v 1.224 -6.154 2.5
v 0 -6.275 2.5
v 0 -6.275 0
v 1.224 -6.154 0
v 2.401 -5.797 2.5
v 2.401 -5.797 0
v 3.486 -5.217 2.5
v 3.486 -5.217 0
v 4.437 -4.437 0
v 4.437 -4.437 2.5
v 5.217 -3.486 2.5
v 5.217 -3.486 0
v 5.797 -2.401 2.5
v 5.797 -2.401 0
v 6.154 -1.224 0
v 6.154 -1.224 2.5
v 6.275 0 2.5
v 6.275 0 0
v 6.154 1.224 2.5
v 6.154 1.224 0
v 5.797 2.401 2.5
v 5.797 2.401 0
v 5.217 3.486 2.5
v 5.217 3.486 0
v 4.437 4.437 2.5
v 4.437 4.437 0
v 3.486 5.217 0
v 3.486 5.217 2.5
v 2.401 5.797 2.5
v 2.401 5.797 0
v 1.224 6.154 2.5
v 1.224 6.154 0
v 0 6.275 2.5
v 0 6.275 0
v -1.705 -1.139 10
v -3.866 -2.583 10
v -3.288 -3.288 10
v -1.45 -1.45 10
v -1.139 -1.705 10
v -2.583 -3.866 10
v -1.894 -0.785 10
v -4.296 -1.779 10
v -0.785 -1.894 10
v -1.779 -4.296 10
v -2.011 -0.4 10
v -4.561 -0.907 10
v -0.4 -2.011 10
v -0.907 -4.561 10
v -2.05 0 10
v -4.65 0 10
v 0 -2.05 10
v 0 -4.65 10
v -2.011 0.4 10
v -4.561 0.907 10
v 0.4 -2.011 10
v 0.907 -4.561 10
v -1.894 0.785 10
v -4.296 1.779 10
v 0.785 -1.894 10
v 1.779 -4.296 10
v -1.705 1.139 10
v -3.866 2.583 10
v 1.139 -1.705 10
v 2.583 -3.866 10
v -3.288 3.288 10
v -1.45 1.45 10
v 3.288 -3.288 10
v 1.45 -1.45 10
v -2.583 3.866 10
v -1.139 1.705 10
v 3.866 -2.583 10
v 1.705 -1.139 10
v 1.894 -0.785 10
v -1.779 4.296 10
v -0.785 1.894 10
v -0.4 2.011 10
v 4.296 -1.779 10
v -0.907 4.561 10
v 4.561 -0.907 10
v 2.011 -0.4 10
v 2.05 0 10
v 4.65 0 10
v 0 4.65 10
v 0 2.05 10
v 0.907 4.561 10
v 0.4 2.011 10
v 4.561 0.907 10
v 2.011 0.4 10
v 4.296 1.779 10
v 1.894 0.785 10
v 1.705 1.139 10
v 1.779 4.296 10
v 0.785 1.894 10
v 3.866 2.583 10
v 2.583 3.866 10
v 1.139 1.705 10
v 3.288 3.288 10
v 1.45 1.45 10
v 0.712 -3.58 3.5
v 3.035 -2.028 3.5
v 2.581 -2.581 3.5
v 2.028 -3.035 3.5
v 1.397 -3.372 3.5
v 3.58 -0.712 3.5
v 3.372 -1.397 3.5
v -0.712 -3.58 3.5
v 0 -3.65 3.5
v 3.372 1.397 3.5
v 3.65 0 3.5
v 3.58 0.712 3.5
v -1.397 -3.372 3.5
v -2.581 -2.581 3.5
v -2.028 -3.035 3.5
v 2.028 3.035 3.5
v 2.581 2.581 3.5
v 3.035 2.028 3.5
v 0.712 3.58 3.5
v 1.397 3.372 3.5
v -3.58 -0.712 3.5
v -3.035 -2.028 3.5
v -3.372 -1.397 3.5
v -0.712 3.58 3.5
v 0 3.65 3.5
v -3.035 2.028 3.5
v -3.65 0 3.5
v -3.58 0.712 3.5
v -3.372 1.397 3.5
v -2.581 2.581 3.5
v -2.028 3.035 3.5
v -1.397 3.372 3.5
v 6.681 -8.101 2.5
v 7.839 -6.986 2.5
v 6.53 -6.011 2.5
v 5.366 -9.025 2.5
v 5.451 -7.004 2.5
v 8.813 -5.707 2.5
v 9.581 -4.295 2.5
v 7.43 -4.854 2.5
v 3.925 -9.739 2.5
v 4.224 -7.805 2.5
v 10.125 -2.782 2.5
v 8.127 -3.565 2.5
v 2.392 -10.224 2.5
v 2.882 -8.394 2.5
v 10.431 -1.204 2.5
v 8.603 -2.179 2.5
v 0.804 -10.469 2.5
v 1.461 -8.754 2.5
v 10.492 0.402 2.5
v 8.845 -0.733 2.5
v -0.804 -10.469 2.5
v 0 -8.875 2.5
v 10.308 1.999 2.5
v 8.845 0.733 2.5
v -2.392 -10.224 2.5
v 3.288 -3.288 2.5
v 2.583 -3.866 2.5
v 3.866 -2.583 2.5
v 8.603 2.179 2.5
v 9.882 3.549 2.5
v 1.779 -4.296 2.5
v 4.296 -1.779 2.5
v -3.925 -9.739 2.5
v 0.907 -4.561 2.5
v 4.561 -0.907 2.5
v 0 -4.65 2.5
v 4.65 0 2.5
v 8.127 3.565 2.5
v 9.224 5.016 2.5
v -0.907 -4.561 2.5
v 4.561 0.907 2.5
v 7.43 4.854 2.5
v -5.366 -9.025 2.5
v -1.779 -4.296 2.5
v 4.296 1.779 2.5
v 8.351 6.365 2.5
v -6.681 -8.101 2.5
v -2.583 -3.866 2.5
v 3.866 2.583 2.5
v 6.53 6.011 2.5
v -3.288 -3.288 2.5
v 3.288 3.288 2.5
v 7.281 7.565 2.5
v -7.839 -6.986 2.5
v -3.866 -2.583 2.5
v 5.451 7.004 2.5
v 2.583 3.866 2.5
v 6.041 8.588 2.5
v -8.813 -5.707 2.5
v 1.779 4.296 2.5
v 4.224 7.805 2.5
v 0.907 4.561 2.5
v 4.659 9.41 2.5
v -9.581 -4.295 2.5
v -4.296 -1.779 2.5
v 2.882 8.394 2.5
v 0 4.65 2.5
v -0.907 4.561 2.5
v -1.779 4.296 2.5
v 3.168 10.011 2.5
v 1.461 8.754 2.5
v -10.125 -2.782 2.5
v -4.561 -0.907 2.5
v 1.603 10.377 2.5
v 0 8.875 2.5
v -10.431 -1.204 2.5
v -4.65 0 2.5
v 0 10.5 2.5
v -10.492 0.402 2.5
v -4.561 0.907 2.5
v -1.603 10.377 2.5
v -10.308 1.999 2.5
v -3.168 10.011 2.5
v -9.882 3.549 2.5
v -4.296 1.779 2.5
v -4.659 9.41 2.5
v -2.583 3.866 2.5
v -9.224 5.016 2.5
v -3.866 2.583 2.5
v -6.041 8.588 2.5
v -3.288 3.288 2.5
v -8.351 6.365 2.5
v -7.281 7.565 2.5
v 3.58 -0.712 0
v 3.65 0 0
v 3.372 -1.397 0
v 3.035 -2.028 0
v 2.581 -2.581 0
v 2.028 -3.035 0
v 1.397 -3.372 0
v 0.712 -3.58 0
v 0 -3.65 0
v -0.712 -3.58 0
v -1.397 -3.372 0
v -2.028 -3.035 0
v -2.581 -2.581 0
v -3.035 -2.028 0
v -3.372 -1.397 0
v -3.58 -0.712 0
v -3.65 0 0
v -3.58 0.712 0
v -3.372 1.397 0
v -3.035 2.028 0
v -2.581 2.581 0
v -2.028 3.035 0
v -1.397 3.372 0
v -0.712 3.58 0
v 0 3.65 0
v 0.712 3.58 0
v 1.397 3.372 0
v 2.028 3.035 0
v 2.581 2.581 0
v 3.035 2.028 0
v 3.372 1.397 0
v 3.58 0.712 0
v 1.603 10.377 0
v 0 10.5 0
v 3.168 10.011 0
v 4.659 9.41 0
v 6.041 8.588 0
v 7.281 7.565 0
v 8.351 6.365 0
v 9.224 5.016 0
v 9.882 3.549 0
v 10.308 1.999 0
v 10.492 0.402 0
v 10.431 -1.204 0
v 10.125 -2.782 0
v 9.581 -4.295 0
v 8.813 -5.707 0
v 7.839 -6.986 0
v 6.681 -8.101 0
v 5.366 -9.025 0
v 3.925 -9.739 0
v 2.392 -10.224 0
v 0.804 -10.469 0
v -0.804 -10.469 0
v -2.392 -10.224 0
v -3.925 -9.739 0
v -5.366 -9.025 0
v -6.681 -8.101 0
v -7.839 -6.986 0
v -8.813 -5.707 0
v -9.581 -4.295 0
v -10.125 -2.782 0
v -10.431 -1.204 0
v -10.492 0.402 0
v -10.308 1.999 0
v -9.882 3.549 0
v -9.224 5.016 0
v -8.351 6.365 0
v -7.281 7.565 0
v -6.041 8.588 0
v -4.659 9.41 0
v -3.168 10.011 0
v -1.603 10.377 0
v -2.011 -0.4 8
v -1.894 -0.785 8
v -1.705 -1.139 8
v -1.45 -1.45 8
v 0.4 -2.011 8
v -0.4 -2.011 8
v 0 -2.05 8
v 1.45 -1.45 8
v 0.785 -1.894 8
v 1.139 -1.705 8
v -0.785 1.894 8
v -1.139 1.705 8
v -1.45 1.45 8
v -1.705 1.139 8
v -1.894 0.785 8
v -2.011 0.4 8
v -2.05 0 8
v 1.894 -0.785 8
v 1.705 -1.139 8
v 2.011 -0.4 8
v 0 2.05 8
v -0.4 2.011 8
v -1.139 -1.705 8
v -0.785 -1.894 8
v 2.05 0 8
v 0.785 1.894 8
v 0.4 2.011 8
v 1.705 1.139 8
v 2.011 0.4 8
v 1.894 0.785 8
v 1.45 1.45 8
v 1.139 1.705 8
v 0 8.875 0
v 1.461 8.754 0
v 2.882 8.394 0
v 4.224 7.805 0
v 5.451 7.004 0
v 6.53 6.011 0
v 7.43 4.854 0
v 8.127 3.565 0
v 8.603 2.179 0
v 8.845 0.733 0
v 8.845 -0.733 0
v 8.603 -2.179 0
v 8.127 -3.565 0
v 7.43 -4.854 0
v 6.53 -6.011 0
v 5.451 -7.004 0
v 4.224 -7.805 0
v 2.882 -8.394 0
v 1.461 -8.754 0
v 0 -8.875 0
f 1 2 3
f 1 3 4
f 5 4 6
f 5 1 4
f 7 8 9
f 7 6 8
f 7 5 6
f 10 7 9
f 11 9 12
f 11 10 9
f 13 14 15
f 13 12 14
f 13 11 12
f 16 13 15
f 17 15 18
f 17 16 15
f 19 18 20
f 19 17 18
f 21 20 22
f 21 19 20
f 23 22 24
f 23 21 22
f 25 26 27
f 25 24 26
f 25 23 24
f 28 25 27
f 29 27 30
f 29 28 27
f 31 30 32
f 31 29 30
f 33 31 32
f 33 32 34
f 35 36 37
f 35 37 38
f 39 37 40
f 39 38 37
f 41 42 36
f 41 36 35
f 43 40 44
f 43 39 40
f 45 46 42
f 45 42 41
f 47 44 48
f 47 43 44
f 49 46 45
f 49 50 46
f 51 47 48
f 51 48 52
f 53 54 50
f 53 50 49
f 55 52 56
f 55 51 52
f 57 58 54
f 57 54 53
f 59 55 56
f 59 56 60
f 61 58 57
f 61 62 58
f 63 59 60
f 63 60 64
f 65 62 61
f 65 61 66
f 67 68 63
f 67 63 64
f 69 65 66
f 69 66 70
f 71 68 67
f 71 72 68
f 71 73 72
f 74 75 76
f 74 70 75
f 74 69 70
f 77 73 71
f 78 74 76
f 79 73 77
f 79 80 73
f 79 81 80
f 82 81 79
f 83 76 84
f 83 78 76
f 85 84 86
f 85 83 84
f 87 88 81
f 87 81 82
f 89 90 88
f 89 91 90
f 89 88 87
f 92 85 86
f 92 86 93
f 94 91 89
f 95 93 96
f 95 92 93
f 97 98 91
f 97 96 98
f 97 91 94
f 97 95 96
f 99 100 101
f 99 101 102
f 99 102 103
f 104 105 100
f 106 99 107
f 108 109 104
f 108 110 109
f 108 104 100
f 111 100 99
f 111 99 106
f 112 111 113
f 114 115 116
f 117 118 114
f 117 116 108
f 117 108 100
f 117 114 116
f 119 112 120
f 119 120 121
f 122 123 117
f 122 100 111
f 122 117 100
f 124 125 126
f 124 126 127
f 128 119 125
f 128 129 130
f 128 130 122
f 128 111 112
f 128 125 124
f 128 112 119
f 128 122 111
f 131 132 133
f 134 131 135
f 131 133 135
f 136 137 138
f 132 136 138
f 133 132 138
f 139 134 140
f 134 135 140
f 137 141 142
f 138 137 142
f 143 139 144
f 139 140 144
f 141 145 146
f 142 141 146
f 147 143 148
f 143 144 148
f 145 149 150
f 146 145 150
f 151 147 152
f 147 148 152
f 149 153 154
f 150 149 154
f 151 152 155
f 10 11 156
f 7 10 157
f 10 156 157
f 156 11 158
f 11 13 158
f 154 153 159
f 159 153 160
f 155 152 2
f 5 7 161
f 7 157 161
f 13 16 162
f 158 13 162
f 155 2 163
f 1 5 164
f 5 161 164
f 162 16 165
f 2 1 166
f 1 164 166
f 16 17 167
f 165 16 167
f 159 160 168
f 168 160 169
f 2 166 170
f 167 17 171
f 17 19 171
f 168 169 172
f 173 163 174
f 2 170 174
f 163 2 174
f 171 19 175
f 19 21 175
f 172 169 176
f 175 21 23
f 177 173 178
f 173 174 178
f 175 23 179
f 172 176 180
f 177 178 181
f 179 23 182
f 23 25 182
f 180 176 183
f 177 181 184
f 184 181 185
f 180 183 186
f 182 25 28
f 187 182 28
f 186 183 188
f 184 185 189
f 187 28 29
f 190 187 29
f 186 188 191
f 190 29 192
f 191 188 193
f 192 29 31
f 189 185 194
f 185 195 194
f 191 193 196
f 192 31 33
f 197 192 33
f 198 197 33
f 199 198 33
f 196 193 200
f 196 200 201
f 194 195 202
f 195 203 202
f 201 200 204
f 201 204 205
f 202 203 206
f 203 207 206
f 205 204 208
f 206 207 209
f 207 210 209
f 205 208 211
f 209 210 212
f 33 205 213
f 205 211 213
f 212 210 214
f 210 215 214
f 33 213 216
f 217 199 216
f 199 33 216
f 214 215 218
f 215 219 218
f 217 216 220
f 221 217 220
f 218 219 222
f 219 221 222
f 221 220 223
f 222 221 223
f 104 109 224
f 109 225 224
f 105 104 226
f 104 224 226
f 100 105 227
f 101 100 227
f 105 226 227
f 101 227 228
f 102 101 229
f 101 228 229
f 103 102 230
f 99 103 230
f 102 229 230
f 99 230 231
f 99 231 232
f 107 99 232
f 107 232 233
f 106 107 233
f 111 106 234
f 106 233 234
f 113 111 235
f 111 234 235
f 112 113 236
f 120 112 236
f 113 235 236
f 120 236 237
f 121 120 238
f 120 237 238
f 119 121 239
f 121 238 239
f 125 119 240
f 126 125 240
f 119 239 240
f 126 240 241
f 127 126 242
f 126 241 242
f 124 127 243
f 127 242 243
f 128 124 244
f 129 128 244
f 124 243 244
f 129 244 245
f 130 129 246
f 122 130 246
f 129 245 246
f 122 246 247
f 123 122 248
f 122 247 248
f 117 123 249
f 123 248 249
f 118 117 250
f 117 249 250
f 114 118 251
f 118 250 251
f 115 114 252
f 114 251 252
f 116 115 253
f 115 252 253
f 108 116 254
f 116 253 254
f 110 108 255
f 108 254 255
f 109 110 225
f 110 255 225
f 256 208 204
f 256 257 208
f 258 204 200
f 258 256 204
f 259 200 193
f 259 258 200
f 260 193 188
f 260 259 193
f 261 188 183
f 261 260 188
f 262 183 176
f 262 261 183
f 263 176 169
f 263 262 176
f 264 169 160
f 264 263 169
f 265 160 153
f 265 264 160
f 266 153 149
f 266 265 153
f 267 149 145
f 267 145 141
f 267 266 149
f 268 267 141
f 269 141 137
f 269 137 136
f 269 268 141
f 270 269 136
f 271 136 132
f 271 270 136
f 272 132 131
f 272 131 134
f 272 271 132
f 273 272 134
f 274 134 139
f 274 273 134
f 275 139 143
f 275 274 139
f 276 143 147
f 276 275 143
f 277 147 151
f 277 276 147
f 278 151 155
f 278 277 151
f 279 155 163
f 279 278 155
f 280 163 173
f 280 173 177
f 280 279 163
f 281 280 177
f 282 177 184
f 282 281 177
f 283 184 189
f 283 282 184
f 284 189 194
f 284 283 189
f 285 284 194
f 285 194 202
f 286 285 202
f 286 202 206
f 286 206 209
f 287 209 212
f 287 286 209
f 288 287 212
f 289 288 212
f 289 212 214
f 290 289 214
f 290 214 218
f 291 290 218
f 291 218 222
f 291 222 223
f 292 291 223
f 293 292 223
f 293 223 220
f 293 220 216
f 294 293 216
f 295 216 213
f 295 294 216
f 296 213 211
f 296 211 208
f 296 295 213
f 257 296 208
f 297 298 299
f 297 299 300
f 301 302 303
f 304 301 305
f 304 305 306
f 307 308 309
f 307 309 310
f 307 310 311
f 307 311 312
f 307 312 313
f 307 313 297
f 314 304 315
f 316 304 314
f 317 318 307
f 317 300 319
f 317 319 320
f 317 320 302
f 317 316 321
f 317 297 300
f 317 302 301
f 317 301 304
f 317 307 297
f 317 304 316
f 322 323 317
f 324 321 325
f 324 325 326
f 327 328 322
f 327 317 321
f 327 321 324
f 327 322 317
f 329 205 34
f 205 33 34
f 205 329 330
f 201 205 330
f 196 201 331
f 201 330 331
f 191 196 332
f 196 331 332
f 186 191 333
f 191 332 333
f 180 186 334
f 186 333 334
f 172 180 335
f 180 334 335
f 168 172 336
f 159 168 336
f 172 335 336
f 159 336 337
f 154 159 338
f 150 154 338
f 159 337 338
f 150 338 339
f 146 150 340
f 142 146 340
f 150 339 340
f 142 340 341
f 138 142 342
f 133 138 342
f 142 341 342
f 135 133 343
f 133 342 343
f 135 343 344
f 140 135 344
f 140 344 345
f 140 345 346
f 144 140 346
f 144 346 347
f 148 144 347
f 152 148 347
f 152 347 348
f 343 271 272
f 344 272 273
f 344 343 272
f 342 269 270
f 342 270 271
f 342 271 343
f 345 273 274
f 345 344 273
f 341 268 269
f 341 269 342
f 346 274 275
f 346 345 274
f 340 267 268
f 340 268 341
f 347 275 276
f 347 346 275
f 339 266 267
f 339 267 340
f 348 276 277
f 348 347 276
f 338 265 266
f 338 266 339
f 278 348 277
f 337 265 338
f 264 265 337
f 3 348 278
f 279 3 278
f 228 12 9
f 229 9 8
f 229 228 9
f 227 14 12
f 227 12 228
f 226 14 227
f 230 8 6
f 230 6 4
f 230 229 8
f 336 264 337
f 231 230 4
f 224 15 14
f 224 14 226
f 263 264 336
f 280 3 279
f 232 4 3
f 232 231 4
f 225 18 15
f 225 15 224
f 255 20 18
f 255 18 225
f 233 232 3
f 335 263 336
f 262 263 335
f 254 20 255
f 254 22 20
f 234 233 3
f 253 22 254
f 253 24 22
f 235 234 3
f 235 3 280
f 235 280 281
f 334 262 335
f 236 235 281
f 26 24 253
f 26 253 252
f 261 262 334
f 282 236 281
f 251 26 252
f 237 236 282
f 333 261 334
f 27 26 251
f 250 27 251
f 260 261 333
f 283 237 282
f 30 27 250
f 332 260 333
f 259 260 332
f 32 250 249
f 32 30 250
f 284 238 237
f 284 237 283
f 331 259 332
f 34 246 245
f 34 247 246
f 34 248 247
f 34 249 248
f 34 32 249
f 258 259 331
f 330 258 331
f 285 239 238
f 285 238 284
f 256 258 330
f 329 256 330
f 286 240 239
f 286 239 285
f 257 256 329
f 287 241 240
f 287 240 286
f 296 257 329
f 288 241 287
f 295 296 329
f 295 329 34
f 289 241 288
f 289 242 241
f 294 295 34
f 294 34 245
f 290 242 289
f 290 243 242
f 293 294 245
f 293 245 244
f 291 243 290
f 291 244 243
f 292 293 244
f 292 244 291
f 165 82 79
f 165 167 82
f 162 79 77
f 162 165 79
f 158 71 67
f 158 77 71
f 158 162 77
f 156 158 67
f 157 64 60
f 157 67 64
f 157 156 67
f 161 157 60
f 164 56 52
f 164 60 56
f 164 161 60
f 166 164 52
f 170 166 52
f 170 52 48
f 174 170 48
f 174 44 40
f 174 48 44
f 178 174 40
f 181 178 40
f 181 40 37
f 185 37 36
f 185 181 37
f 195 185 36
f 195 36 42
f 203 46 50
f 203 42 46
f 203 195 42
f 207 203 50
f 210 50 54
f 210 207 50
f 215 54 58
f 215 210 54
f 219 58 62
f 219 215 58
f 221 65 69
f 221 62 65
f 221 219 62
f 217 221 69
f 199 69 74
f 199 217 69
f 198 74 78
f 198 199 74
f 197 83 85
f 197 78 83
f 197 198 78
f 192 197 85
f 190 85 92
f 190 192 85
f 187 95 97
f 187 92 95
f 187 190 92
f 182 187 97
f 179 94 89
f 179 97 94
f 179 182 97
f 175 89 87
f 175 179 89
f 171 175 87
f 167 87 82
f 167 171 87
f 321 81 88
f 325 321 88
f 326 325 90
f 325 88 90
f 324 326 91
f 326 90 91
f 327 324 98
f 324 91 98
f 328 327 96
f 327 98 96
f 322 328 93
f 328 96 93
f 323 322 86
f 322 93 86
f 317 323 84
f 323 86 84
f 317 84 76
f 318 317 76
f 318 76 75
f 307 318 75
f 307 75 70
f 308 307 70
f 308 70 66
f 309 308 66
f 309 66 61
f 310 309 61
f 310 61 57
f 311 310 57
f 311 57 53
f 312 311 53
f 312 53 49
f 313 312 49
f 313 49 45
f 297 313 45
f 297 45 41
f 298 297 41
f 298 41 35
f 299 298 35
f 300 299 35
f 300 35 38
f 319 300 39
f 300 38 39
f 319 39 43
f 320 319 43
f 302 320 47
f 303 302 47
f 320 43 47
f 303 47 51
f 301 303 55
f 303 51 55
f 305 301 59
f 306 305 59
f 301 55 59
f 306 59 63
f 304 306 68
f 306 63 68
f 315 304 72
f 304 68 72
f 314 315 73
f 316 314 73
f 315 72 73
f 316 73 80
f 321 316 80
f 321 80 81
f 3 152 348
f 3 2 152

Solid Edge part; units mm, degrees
sketch "Sketch1" plane through (0, 0, 0) normal (0, 0, 1) x (1, 0, 0)
  circle A0 centre (0, 0) radius 4.65
extrude "Protrusion1" add sketch "Sketch1" along normal blind 10
sketch "Sketch2" plane through (0, 0, 10) normal (0, 0, 1) x (1, 0, 0)
  circle A0 centre (0, 0) radius 2.05
extrude "VaciadoExtruido_1" cut sketch "Sketch2" against normal blind 2
sketch "Sketch3" plane through (0, 0, 0) normal (0, 0, -1) x (1, 0, 0)
  circle A0 centre (0, 0) radius 3.65
extrude "VaciadoExtruido_2" cut sketch "Sketch3" against normal blind 3.5
extrude "ProtrusiónExtruida_2" [suppressed]
sketch "Sketch4" plane through (0, 0, 0) normal (0, 0, -1) x (0, 1, 0)
  circle A0 centre (0, 0) radius 10.5
  circle A1 centre (0, 0) radius 4.65
  dimension "D1" = 21
extrude "Protrusion2" add sketch "Sketch4" against normal blind 2.5
sketch "Sketch5" plane through (0, 0, 0) normal (1, 0, 0) x (0, 1, 0)
  line L0 (8.875, 0) -> (6.275, 0)
  line L1 (6.275, 0) -> (6.275, 2.5)
  line L2 (6.275, 2.5) -> (8.875, 2.5)
  line L3 (8.875, 2.5) -> (8.875, 0)
revolve "VaciadoPorRevolución_2" cut sketch "Sketch5" angle 180 about axis through (0, 0, 0) along (0, 0, -1)
